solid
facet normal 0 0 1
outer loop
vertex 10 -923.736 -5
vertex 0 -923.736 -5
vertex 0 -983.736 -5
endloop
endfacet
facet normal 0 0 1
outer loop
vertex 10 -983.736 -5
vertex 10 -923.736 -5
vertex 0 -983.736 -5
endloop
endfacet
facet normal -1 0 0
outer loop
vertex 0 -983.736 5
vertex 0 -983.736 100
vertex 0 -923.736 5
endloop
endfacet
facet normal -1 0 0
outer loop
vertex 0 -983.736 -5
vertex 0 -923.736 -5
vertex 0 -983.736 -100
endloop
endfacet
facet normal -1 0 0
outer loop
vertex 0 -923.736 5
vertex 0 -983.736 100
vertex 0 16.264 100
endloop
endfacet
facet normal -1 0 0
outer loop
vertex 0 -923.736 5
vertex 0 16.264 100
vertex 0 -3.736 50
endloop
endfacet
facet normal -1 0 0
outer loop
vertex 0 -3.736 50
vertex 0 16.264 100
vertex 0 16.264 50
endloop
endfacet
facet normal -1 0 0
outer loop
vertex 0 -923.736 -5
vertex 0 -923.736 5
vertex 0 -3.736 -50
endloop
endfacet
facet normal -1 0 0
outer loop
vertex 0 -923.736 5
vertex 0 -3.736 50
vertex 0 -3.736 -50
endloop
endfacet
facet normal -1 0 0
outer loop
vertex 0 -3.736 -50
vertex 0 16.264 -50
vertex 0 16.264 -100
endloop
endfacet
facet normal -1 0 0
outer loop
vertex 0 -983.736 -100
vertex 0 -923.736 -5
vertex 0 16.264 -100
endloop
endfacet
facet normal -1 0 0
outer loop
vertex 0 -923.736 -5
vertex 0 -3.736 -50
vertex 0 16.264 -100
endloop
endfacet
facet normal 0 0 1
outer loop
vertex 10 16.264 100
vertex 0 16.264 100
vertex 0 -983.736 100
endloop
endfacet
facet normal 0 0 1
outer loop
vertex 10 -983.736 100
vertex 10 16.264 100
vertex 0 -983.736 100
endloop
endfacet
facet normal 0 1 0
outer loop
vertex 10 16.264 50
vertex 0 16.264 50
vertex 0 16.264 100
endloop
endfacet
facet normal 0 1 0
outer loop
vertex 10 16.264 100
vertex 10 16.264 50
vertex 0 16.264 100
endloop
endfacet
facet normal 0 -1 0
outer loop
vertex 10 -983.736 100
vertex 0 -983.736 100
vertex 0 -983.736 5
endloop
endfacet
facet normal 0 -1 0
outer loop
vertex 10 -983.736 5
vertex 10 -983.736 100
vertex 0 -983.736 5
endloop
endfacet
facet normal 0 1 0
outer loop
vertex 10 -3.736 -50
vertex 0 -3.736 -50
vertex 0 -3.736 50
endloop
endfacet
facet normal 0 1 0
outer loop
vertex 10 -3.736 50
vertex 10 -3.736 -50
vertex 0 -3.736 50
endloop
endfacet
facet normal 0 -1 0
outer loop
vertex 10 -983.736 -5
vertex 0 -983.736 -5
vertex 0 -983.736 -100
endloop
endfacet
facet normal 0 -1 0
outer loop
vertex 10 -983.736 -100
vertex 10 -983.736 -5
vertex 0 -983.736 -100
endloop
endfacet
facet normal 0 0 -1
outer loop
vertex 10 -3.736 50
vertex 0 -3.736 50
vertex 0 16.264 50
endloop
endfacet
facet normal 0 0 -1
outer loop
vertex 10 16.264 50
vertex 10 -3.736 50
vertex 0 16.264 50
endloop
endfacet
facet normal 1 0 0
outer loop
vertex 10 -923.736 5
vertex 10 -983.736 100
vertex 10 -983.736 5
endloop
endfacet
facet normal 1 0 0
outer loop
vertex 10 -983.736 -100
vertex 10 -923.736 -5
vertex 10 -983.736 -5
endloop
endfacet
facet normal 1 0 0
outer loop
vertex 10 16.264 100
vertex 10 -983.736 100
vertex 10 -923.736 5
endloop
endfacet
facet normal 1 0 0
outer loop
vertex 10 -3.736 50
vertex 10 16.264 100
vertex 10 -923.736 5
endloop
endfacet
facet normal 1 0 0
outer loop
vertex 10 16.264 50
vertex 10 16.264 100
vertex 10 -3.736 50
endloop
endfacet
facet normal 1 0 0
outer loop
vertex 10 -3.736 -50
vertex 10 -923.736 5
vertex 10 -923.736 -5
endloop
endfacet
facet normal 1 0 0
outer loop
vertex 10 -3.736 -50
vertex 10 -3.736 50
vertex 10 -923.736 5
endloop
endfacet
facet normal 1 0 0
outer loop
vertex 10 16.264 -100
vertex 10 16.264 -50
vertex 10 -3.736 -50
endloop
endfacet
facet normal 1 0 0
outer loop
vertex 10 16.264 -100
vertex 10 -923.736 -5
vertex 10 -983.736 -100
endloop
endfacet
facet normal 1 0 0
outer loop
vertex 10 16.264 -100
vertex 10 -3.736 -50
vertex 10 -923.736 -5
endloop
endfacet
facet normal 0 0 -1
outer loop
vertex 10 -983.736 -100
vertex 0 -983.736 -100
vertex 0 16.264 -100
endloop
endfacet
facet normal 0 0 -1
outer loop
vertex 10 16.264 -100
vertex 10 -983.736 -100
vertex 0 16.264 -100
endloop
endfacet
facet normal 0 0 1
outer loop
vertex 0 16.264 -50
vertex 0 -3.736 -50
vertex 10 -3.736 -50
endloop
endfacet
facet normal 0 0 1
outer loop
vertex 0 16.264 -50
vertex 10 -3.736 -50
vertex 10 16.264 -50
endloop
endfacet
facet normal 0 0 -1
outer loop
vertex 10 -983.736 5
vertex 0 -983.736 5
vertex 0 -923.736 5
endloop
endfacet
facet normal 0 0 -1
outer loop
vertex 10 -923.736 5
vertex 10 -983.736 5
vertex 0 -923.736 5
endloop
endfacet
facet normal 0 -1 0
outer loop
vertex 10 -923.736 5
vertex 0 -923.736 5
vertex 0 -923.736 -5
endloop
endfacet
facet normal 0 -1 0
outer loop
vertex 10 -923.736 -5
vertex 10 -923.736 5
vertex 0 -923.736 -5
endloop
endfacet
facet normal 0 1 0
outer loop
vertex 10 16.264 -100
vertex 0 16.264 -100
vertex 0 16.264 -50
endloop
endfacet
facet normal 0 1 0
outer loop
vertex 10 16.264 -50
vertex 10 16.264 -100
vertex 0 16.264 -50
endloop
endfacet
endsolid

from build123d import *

# Parameters (mm, degrees)
BOSS_EXTRUDE1_DEPTH = 10
SKETCH2_W           = 100
SKETCH2_H           = 20
CUT_EXTRUDE1_DEPTH  = 10


with BuildPart() as part:
    # Sketch1 → Boss-Extrude1 (new body)
    with BuildSketch(Plane(origin=(0, 0, 0), x_dir=(0, 0, -1), z_dir=(1, 0, 0))):
        Polygon((100, 16.263736264), (-100, 16.263736264), (-100, -983.736263736), (-5, -983.736263736), (-5, -923.736263736), (5, -923.736263736), (5, -983.736263736), (100, -983.736263736), align=None)
    extrude(amount=BOSS_EXTRUDE1_DEPTH)

    # Sketch2 → Cut-Extrude1 (cut)
    with BuildSketch(Plane.ZY):
        with Locations((0, 6.263736264)):
            Rectangle(SKETCH2_W, SKETCH2_H)
    extrude(amount=-CUT_EXTRUDE1_DEPTH, mode=Mode.SUBTRACT)


solid = part.part
